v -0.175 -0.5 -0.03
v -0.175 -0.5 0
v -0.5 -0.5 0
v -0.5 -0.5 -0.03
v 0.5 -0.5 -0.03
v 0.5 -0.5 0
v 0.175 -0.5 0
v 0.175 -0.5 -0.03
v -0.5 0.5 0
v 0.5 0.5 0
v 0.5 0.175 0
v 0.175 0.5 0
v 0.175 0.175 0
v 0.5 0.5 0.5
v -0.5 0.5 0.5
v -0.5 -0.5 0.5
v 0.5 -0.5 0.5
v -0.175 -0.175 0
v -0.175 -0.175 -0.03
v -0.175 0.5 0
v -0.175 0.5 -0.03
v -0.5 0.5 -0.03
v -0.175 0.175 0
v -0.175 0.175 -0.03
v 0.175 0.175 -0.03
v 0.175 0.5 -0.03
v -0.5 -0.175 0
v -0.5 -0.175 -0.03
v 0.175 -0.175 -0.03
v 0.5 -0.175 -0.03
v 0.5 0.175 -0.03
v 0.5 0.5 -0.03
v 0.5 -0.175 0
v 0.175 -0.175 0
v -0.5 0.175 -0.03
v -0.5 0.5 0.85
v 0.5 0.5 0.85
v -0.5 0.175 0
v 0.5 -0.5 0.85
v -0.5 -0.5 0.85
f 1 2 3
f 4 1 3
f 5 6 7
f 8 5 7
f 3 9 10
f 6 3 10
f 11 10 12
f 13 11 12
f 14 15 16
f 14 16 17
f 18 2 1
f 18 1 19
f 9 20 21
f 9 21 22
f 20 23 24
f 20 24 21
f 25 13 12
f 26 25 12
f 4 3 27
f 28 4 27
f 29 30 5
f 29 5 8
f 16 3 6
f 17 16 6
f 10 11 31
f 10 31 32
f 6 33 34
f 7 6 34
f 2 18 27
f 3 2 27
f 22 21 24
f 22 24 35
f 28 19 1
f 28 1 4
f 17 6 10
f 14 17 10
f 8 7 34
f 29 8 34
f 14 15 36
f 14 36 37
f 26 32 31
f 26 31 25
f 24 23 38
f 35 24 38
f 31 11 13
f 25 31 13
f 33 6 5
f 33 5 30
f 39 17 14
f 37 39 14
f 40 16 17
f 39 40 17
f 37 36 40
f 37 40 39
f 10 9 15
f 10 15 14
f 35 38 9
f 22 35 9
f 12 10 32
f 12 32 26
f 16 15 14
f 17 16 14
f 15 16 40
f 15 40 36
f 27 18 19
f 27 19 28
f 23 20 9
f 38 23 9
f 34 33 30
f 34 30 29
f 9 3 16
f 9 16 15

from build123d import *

# Parameters (mm, degrees)
SKIZZE1_W                         = 1
SKIZZE1_H                         = 1
AUFSATZ_LINEAR_AUSTRAGEN1_DEPTH   = 0.5
SKIZZE2_W                         = 0.325
SKIZZE2_H                         = 0.325
AUFSATZ_LINEAR_AUSTRAGEN2_DEPTH   = 0.03
AUFSATZ_LINEAR_AUSTRAGEN2_2_DEPTH = 0.03
AUFSATZ_LINEAR_AUSTRAGEN2_3_DEPTH = 0.03
AUFSATZ_LINEAR_AUSTRAGEN2_4_DEPTH = 0.03
SKIZZE3_W                         = 1
SKIZZE3_H                         = 1
AUFSATZ_LINEAR_AUSTRAGEN3_DEPTH   = 0.35


with BuildPart() as part:
    # Skizze1 → Aufsatz-Linear austragen1 (new body)
    with BuildSketch(Plane.XY):
        Rectangle(SKIZZE1_W, SKIZZE1_H)
    extrude(amount=AUFSATZ_LINEAR_AUSTRAGEN1_DEPTH)


with BuildPart() as body_2:
    # Skizze2 → Aufsatz-Linear austragen2 (new body)
    with BuildSketch(Plane(origin=(0, 0, 0), x_dir=(-1, 0, 0), z_dir=(0, 0, -1))):
        with Locations((-0.3375, 0.3375)):
            Rectangle(SKIZZE2_W, SKIZZE2_H)
    extrude(amount=AUFSATZ_LINEAR_AUSTRAGEN2_DEPTH)


with BuildPart() as body_3:
    # Skizze2 → Aufsatz-Linear austragen2 2 (new body)
    with BuildSketch(Plane(origin=(0, 0, 0), x_dir=(-1, 0, 0), z_dir=(0, 0, -1))):
        with Locations((0.3375, 0.3375)):
            Rectangle(SKIZZE2_W, SKIZZE2_H)
    extrude(amount=AUFSATZ_LINEAR_AUSTRAGEN2_2_DEPTH)


with BuildPart() as body_4:
    # Skizze2 → Aufsatz-Linear austragen2 3 (new body)
    with BuildSketch(Plane(origin=(0, 0, 0), x_dir=(-1, 0, 0), z_dir=(0, 0, -1))):
        with Locations((-0.3375, -0.3375)):
            Rectangle(SKIZZE2_W, SKIZZE2_H)
    extrude(amount=AUFSATZ_LINEAR_AUSTRAGEN2_3_DEPTH)


with BuildPart() as body_5:
    # Skizze2 → Aufsatz-Linear austragen2 4 (new body)
    with BuildSketch(Plane(origin=(0, 0, 0), x_dir=(-1, 0, 0), z_dir=(0, 0, -1))):
        with Locations((0.3375, -0.3375)):
            Rectangle(SKIZZE2_W, SKIZZE2_H)
    extrude(amount=AUFSATZ_LINEAR_AUSTRAGEN2_4_DEPTH)


with BuildPart() as body_6:
    # Skizze3 → Aufsatz-Linear austragen3 (new body)
    with BuildSketch(Plane.XY.offset(0.5)):
        Rectangle(SKIZZE3_W, SKIZZE3_H)
    extrude(amount=AUFSATZ_LINEAR_AUSTRAGEN3_DEPTH)


solid = Compound([part.part, body_2.part, body_3.part, body_4.part, body_5.part, body_6.part])
